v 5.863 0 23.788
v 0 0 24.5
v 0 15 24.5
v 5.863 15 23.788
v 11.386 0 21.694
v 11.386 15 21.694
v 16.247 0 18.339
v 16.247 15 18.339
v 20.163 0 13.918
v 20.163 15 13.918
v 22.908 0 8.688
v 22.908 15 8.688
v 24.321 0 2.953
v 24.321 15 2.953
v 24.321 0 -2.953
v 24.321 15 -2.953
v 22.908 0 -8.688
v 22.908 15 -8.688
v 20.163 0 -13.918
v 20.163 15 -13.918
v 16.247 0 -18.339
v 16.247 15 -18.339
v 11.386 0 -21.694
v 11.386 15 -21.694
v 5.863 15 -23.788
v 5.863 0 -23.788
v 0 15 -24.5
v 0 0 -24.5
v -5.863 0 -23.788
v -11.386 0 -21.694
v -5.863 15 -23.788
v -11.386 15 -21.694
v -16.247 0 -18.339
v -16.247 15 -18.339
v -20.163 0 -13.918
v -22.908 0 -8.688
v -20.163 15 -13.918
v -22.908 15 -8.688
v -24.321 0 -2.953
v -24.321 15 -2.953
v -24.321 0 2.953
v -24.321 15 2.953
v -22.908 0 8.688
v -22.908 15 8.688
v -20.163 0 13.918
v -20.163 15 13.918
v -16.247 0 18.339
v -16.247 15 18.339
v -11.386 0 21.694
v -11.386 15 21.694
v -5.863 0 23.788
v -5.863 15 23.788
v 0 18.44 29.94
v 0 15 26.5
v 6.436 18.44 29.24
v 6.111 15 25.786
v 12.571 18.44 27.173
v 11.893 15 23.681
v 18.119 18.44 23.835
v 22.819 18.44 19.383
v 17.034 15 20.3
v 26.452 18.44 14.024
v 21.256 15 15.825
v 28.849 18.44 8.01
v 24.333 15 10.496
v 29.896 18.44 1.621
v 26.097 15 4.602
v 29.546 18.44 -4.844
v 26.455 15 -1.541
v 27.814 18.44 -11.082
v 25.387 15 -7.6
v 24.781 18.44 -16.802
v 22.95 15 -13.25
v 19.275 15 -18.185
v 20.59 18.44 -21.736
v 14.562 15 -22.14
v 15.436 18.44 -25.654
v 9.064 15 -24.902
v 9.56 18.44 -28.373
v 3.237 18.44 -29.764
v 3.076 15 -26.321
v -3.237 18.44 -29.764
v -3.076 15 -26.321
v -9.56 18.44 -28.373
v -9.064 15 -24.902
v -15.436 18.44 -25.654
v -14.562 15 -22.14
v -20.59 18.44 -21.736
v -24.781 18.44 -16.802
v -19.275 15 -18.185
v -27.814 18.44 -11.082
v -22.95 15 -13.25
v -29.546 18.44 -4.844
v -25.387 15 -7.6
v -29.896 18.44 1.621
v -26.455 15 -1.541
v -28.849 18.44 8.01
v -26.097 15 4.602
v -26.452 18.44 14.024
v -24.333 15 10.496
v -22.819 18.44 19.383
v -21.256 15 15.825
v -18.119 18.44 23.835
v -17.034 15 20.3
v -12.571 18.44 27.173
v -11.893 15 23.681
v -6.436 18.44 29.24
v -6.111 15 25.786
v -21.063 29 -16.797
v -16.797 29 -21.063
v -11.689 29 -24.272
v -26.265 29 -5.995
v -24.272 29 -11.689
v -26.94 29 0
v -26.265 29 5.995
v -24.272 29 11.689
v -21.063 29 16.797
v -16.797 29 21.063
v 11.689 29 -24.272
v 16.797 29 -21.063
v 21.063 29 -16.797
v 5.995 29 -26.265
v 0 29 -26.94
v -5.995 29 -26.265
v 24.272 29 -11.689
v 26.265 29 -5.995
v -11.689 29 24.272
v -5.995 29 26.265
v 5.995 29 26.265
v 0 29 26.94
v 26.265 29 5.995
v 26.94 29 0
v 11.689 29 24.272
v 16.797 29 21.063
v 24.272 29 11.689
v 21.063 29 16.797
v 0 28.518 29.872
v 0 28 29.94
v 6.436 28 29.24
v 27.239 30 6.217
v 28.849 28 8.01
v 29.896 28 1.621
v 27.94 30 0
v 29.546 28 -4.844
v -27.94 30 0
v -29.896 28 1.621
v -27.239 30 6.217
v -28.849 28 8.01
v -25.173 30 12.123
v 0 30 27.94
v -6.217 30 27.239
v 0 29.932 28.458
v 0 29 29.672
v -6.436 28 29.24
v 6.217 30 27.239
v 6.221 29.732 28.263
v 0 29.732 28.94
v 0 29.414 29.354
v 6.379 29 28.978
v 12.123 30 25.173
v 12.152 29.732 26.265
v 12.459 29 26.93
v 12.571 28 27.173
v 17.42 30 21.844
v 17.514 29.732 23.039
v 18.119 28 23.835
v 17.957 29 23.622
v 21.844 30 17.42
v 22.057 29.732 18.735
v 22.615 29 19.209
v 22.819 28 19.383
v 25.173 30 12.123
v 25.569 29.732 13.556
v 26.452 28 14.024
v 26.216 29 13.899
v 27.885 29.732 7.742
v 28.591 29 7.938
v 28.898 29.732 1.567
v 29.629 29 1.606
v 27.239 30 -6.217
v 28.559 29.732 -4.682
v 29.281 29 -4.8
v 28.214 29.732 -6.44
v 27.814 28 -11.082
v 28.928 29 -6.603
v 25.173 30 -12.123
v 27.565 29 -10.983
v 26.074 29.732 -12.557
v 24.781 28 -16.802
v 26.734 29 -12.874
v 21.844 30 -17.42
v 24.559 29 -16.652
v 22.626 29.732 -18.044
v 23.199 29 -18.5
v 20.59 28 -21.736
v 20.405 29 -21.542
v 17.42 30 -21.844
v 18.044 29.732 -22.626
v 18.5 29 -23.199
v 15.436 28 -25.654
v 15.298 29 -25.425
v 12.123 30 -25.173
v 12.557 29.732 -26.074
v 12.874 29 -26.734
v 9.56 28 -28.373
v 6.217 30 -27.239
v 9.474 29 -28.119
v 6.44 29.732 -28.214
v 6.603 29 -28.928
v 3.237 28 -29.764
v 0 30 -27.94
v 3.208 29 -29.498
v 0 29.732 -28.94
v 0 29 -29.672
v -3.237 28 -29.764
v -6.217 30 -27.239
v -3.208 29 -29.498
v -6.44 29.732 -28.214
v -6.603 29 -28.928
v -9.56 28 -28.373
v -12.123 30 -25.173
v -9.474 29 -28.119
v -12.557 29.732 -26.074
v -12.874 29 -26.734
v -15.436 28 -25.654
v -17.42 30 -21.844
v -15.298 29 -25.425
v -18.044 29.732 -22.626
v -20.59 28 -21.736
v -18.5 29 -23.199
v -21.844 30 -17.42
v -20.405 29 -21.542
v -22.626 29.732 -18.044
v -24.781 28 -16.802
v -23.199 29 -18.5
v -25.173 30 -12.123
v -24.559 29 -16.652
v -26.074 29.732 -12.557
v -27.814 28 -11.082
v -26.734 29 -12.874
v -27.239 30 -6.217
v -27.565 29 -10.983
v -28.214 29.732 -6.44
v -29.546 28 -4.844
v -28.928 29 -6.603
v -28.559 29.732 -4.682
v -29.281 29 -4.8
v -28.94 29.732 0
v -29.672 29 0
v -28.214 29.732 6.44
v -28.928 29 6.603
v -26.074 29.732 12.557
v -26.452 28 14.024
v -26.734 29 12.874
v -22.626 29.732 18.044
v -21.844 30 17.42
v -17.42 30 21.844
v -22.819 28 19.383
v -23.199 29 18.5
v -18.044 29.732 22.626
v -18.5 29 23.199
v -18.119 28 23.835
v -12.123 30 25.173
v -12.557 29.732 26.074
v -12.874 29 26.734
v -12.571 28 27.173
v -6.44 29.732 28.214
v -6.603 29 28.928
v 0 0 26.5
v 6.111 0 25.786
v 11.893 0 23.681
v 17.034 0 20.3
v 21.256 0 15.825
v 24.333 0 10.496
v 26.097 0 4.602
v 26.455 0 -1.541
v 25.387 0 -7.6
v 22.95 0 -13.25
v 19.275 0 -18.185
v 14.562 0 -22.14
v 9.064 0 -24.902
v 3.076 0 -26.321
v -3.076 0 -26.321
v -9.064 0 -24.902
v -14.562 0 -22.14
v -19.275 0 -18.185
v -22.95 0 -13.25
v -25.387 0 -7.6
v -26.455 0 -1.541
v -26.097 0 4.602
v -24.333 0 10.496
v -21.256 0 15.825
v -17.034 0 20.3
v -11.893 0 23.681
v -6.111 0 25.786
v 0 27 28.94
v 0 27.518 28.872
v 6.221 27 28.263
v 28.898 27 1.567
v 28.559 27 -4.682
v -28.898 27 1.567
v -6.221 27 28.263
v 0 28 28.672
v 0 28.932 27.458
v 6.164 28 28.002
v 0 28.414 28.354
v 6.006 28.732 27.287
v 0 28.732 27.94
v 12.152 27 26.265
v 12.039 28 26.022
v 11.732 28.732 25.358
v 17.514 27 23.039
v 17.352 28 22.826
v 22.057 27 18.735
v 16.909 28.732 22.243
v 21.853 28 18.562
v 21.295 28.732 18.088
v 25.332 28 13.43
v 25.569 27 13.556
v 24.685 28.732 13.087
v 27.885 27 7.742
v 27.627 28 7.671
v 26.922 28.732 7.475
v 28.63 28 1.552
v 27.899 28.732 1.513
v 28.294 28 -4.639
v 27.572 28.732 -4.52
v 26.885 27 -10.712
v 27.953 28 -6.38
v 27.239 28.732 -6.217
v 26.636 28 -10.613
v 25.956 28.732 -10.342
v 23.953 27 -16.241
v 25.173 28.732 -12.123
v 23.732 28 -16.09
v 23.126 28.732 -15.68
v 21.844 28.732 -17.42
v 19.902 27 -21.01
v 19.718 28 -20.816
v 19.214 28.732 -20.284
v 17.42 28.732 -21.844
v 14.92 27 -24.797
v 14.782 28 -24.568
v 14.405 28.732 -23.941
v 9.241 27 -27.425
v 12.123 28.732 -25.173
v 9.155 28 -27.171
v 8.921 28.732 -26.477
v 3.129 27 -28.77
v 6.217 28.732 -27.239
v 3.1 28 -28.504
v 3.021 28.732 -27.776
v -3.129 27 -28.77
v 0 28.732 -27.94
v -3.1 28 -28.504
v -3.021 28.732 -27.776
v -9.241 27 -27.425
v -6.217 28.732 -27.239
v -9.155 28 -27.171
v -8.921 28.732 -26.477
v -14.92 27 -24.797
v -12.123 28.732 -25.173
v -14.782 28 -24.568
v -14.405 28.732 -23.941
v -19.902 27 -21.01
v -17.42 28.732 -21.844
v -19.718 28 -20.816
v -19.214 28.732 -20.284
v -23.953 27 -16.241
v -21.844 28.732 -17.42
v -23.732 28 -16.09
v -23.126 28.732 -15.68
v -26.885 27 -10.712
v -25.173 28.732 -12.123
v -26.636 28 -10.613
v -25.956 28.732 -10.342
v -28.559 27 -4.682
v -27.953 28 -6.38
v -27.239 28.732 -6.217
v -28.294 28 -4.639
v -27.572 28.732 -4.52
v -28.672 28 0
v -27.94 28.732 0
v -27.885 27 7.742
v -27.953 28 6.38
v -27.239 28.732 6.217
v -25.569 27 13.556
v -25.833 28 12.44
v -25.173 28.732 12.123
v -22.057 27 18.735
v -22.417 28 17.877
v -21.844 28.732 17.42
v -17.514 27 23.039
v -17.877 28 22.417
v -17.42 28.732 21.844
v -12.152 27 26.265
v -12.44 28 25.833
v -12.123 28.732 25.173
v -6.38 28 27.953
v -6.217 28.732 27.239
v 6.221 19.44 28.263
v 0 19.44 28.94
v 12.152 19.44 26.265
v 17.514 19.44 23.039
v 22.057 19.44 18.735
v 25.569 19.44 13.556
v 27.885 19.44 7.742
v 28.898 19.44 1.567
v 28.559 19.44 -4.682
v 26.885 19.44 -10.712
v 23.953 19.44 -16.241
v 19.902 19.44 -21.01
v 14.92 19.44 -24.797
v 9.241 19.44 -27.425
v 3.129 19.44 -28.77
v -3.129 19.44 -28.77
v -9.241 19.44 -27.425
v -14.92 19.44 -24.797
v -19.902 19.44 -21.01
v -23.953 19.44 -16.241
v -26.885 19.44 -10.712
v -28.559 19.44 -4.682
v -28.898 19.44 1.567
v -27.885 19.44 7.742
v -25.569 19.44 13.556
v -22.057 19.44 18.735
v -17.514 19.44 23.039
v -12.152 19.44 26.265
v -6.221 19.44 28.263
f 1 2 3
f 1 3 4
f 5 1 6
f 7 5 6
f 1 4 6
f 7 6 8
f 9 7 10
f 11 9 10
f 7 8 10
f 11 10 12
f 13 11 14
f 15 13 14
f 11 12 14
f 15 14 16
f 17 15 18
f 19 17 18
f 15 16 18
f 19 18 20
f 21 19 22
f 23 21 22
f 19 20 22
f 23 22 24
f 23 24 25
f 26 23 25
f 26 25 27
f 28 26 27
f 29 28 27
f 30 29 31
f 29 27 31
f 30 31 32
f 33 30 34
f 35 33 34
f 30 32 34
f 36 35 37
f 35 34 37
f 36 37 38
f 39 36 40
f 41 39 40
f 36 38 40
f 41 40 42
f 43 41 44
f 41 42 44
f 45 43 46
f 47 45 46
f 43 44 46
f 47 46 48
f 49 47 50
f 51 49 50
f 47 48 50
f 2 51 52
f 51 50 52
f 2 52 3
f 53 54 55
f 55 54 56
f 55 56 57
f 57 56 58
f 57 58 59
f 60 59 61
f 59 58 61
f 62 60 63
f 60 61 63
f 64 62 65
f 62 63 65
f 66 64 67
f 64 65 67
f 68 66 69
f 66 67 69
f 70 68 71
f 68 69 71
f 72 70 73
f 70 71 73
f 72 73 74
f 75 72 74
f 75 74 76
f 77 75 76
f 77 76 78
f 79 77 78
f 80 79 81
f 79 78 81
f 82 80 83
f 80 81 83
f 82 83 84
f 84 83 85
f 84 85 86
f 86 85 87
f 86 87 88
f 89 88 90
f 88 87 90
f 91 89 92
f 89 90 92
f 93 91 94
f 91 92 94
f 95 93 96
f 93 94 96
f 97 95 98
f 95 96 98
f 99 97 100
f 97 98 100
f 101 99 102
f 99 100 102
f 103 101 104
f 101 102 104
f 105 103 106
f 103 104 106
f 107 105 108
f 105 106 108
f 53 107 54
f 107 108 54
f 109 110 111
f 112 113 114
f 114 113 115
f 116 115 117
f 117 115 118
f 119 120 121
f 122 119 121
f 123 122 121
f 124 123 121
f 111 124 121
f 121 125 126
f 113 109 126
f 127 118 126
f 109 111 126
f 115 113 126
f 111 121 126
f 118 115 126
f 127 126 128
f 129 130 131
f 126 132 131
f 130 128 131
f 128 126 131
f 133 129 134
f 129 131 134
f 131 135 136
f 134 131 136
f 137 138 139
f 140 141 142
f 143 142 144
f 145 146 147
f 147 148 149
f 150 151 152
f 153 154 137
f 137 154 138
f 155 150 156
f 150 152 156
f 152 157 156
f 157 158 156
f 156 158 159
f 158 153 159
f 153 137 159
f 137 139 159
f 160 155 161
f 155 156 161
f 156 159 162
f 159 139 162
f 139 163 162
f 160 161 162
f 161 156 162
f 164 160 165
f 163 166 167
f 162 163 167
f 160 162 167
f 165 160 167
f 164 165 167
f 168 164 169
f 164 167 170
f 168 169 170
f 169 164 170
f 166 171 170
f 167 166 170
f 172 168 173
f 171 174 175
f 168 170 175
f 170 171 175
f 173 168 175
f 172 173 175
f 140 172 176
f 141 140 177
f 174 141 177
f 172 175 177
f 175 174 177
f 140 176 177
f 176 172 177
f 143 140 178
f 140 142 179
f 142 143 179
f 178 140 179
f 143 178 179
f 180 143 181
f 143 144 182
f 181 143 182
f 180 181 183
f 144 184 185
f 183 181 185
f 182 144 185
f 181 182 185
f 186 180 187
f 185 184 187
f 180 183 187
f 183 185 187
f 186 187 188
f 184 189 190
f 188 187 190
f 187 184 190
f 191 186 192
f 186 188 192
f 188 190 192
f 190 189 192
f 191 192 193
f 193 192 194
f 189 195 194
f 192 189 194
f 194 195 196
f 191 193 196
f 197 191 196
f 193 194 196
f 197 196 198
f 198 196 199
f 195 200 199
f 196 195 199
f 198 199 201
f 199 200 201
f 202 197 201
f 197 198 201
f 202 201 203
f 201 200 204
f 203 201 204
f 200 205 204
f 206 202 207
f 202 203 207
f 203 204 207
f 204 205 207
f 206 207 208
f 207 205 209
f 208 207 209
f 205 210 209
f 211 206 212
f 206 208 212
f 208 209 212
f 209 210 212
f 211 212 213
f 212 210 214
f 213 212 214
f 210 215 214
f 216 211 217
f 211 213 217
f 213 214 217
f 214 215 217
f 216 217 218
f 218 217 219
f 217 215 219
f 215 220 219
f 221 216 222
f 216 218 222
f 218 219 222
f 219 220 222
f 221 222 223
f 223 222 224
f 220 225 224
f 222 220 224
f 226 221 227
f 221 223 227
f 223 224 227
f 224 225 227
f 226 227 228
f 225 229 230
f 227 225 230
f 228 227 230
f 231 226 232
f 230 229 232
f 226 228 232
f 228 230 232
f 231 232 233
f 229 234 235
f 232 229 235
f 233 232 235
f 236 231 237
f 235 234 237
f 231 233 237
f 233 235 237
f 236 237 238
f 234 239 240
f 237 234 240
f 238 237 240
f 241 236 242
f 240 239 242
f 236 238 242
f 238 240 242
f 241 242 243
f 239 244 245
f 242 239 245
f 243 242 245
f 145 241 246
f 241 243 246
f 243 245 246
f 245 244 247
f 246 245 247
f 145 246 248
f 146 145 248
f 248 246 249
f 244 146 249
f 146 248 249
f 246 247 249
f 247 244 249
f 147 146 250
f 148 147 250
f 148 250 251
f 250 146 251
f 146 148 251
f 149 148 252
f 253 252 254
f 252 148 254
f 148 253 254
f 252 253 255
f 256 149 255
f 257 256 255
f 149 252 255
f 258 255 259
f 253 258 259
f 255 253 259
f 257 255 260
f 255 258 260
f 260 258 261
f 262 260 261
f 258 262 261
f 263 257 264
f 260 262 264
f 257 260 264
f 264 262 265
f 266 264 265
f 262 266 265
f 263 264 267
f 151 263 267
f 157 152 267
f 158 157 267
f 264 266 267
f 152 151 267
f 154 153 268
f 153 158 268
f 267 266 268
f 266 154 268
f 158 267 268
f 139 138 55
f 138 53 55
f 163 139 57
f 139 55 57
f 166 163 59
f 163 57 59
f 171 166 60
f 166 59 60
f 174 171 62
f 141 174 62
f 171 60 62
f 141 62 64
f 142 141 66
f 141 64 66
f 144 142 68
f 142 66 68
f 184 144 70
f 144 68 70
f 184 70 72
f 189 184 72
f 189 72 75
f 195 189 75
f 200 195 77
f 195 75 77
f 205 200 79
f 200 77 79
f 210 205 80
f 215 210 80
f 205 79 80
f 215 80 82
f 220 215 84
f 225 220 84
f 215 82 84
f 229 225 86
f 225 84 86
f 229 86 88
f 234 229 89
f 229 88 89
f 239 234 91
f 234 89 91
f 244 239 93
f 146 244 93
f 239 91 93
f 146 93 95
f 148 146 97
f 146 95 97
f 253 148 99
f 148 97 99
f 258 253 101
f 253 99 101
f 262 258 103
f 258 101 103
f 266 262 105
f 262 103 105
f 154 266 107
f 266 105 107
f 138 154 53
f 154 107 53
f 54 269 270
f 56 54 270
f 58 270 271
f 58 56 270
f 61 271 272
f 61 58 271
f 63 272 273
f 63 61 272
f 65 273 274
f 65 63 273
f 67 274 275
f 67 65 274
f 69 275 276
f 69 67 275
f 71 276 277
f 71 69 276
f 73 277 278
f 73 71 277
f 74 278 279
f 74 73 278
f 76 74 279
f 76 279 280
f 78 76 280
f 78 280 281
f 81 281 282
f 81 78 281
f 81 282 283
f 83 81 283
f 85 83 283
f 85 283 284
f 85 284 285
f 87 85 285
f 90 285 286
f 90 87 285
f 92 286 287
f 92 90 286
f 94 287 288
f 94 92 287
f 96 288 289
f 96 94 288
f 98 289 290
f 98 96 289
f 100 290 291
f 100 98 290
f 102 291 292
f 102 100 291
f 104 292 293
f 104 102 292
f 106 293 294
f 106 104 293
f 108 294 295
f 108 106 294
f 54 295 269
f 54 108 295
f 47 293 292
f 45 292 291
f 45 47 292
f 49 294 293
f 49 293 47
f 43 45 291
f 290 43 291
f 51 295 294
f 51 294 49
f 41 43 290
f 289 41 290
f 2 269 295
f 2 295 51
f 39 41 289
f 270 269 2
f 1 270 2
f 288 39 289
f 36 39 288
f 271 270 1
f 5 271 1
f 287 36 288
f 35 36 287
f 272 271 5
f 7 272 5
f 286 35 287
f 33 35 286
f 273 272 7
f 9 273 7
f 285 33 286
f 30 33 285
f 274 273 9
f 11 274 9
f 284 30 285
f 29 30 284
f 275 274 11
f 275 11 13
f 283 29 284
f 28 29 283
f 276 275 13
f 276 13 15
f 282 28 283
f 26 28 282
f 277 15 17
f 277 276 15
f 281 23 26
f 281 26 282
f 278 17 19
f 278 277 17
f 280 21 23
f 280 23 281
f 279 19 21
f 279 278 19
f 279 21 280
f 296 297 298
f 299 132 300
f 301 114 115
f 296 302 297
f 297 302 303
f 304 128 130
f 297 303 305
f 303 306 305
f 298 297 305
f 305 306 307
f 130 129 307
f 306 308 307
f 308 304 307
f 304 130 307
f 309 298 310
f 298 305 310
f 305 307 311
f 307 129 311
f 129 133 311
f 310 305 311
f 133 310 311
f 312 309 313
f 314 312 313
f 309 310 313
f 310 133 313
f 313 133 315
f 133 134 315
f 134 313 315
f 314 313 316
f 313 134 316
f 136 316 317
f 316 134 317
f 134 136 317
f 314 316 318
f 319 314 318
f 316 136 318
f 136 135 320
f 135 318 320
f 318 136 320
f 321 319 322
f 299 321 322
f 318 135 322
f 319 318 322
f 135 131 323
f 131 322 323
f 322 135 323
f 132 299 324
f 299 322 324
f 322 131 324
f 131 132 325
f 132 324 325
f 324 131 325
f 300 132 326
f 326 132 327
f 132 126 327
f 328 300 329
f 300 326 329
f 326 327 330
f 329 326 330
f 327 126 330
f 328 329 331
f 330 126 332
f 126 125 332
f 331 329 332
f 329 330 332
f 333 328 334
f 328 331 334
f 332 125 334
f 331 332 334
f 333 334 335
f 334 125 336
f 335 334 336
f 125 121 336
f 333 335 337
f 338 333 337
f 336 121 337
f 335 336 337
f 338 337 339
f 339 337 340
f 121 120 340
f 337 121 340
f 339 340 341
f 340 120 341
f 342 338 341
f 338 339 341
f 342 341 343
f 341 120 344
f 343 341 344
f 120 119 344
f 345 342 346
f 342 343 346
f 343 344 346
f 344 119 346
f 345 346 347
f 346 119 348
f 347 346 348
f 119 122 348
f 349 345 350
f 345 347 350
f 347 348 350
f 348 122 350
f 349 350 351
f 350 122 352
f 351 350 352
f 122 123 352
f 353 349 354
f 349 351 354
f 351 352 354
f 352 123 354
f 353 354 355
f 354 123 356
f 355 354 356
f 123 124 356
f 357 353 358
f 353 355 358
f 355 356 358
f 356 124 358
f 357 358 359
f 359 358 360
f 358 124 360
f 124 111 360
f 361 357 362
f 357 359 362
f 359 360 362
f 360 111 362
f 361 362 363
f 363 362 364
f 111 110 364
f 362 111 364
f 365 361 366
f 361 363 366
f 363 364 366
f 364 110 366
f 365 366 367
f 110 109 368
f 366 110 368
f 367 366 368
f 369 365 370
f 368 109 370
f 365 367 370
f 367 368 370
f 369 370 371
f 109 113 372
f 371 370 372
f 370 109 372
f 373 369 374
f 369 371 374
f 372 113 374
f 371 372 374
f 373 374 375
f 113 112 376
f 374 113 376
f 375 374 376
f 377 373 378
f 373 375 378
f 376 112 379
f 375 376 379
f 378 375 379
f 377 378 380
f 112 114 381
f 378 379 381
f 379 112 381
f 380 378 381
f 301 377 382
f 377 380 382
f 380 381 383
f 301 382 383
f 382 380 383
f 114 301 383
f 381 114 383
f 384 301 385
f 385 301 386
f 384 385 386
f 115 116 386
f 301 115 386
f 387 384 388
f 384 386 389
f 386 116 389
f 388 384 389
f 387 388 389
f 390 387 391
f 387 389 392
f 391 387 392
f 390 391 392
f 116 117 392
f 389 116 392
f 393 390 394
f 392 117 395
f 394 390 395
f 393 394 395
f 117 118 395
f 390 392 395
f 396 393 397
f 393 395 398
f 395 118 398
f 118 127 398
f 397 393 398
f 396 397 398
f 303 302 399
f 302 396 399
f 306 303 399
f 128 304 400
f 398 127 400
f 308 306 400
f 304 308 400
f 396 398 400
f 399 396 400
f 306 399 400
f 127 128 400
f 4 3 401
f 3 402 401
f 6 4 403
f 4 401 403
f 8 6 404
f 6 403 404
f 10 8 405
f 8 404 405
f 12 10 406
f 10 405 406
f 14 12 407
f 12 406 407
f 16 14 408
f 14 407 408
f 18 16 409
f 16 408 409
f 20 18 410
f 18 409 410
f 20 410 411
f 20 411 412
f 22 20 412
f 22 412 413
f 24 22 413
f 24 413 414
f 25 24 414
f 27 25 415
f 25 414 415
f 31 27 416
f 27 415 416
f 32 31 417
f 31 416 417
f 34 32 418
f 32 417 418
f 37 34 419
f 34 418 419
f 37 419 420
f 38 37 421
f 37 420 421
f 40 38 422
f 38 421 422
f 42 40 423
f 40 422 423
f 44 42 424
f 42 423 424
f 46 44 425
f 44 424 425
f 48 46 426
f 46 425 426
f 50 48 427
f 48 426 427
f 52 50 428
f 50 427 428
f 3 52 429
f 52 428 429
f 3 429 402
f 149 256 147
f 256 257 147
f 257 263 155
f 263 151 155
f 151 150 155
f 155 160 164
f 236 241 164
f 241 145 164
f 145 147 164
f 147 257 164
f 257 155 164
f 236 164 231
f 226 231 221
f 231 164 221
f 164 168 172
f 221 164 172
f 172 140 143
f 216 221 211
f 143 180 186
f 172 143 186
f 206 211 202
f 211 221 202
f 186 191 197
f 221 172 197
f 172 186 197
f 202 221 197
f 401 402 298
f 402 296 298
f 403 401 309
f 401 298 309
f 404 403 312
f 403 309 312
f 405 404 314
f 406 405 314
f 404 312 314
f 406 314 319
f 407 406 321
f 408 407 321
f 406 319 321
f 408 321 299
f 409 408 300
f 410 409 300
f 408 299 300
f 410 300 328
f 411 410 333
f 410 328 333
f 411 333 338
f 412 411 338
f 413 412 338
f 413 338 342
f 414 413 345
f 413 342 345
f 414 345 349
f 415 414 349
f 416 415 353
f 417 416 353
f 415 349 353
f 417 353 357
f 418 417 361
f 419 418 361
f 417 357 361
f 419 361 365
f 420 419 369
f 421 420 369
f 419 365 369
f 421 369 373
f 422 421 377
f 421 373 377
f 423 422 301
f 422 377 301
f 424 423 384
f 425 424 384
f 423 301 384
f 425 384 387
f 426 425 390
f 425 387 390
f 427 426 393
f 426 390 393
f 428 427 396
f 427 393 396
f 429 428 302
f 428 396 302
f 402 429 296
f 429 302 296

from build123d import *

# Parameters (mm, degrees)
F0_W = 15
F0_H = 2


with BuildPart() as f1:
    # F0 (on Right) → F1 (revolve)
    with BuildSketch(Plane.YZ):
        with Locations((7.5, 25.5)):
            Rectangle(F0_W, F0_H)
        Polygon((15, 26.5), (15, 24.5), (19.44, 28.94), (17.44, 28.94), align=None)
        Polygon((17.44, 28.94), (19.44, 28.94), (20.44, 29.94), (18.44, 29.94), align=None)
        with BuildLine():
            Line((29, 26.94), (29, 0))
            Line((29, 0), (30, 0))
            Line((30, 0), (30, 27.94))
            ThreePointArc((30, 27.94), (29.4142135624, 29.3542135624), (28, 29.94))
            Line((28, 29.94), (20.44, 29.94))
            Line((20.44, 29.94), (19.44, 28.94))
            Line((19.44, 28.94), (27, 28.94))
            ThreePointArc((27, 28.94), (28.4142135624, 28.3542135624), (29, 26.94))
        make_face()
    revolve(axis=Axis((0, 7.5, 0), (0, 1, 0)))


solid = f1.part
